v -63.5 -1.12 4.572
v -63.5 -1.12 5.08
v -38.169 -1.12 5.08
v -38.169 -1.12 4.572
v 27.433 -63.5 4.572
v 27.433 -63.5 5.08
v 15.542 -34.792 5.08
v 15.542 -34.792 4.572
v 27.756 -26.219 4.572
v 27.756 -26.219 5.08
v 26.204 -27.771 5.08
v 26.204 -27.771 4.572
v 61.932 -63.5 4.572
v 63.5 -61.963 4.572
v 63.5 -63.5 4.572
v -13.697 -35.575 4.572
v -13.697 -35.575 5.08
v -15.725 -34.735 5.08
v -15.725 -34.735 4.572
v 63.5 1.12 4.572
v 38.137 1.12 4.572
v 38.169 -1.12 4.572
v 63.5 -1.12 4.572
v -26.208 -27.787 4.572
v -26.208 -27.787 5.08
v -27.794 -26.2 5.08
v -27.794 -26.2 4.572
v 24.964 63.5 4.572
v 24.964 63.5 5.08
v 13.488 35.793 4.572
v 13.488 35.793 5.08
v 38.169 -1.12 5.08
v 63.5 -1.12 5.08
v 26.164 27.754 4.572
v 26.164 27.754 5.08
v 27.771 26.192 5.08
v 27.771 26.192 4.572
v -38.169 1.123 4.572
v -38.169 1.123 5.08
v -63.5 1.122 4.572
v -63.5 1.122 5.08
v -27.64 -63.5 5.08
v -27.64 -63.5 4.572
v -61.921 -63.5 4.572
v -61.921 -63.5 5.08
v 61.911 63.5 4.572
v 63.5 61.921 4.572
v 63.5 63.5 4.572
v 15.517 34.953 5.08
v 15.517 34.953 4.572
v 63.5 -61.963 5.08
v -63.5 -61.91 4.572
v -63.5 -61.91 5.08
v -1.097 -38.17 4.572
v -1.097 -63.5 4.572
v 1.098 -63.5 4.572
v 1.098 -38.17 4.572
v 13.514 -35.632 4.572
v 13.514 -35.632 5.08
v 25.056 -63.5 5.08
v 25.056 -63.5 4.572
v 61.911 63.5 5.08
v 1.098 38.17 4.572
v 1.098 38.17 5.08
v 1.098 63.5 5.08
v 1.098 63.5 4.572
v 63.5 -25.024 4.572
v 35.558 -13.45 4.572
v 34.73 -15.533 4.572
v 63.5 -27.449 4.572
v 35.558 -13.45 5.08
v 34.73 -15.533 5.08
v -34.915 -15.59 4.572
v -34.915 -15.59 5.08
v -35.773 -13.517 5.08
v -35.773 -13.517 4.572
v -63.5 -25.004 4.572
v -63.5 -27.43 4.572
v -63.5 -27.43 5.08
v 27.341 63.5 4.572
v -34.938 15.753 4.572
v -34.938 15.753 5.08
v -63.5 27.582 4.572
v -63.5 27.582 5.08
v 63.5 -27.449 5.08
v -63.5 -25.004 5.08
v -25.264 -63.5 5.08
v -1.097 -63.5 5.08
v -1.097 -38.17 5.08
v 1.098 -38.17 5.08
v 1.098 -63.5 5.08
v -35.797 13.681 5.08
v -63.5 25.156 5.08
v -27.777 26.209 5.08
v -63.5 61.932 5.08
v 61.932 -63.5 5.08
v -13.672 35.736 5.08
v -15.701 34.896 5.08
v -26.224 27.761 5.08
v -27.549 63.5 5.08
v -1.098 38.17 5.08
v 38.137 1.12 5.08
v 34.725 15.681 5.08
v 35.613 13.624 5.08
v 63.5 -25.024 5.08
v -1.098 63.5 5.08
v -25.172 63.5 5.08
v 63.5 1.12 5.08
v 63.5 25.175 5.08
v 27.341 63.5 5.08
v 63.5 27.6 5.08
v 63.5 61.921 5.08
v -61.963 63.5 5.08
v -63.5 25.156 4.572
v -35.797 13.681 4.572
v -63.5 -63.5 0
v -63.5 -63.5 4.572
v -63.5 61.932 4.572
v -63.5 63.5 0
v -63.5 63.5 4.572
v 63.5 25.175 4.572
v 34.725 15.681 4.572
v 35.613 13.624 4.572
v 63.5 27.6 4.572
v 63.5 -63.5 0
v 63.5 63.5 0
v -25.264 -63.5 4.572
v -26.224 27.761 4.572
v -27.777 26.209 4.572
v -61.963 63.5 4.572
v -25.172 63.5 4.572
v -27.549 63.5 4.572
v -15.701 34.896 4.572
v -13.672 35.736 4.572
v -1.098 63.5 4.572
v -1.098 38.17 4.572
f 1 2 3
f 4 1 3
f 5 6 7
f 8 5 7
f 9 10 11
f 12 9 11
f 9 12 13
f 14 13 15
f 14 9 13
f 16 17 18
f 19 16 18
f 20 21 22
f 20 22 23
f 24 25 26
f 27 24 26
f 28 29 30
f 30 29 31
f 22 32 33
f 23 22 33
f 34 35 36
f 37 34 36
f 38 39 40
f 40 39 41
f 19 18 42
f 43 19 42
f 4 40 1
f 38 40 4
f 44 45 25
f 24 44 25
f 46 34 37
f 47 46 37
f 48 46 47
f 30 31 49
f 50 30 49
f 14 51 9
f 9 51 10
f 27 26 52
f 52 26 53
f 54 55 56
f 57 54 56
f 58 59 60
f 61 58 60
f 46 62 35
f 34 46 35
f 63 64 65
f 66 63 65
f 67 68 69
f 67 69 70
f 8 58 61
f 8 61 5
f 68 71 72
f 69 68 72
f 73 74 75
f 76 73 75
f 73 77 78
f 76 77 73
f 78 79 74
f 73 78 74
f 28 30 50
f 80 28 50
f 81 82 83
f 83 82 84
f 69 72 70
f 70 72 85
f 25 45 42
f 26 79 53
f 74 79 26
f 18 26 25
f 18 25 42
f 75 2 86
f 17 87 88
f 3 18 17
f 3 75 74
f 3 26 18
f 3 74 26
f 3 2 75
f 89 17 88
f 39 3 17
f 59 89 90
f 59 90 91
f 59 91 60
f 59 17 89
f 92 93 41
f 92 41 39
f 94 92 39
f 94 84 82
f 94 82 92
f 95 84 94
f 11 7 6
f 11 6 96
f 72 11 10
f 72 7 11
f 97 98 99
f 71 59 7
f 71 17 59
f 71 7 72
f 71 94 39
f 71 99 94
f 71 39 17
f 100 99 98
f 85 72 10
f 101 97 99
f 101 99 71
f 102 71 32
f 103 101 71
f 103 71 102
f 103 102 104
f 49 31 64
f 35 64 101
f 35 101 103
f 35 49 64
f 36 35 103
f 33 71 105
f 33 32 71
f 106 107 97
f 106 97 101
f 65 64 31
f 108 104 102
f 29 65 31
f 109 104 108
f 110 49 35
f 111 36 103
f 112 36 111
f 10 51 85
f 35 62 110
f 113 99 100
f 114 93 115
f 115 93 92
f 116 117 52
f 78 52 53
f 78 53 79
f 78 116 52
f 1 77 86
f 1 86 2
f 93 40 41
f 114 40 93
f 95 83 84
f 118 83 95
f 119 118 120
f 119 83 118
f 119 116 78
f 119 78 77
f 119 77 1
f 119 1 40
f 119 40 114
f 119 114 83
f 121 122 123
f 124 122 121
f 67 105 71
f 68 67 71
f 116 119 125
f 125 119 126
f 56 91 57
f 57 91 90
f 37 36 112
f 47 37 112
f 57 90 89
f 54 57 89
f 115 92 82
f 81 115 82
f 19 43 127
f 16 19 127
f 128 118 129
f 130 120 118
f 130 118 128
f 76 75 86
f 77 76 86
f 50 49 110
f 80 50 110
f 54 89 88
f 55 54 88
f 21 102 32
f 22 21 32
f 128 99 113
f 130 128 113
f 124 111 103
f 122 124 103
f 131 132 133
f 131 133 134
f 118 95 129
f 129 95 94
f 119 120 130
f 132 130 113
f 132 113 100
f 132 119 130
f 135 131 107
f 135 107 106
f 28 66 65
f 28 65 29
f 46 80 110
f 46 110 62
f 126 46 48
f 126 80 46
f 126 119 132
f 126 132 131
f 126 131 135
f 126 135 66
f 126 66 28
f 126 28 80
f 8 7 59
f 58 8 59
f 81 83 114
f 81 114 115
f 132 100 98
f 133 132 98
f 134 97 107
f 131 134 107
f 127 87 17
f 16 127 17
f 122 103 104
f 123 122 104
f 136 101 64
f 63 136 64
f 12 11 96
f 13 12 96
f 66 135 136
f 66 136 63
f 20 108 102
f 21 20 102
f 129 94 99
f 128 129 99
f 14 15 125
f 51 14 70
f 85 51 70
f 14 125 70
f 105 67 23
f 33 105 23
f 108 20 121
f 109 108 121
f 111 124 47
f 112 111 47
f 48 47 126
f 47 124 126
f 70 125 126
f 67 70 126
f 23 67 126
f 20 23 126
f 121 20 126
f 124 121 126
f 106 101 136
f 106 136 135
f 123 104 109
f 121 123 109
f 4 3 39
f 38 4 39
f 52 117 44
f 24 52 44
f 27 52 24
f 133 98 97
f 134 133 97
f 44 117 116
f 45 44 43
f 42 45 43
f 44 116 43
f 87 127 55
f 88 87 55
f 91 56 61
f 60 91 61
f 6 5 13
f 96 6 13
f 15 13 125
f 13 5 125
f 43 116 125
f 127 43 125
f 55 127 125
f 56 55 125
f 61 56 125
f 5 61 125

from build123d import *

# Parameters (mm, degrees)
F0_W     = 127
F0_H     = 127
F1_DEPTH = 5.08
F2_W     = 2.19577
F2_H     = 52.046703
F3_DEPTH = 0.508


with BuildPart() as f1:
    # F0 (on Top) → F1 (new body)
    with BuildSketch(Plane.XY):
        Rectangle(F0_W, F0_H)
    extrude(amount=F1_DEPTH)

    # F2 (on face) → F3 (cut)
    with BuildSketch(Plane.XY.offset(5.08)):
        Polygon((38.169024, -1.120174), (90.2161, -1.120174), (90.2161, 1.120174), (38.13681, 1.120174), align=None)
        Polygon((-1.096878, -38.1697), (-1.097885, -90.216374), (1.097885, -90.216374), (1.097885, -38.169671), align=None)
        with Locations((0, 64.193022)):
            Rectangle(F2_W, F2_H)
        Polygon((-38.168937, 1.123112), (-90.2161, 1.120174), (-90.2161, -1.120174), (-38.169024, -1.120174), align=None)
        Polygon((27.771347, 26.192397), (64.574188, 62.995238), (62.990023, 64.579402), (26.164404, 27.753783), align=None)
        Polygon((26.204134, -27.77076), (63.005977, -64.574029), (64.558622, -63.021384), (27.756045, -26.218808), align=None)
        Polygon((-63.026599, 64.563836), (-64.579243, 63.011192), (-27.776666, 26.208615), (-26.224022, 27.761259), align=None)
        Polygon((-27.793985, -26.20045), (-64.594809, -63.00543), (-63.010644, -64.589595), (-26.207804, -27.786754), align=None)
        Polygon((35.612549, 13.623586), (83.697778, 33.54114), (82.840434, 35.610951), (34.725444, 15.681069), align=None)
        Polygon((13.513826, -35.632124), (33.430295, -83.717366), (35.458923, -82.877081), (15.541512, -34.792197), align=None)
        Polygon((-33.589701, 83.821042), (-35.618328, 82.980757), (-15.700917, 34.895874), (-13.67229, 35.736159), align=None)
        Polygon((-35.772999, -13.517161), (-83.857183, -33.437463), (-82.999839, -35.507274), (-34.914611, -15.58972), align=None)
        Polygon((34.73032, -15.532565), (82.815549, -35.450119), (83.672893, -33.380308), (35.557903, -13.450427), align=None)
        Polygon((-15.724882, -34.735455), (-35.643213, -82.819926), (-33.614586, -83.660211), (-13.697175, -35.575328), align=None)
        Polygon((35.434038, 83.037912), (33.405411, 83.878197), (13.488, 35.793313), (15.516627, 34.953028), align=None)
        Polygon((-34.938291, 15.753233), (-83.024724, 35.668105), (-83.882068, 33.598294), (-35.796839, 13.68074), align=None)
    extrude(amount=-F3_DEPTH, mode=Mode.SUBTRACT)


solid = f1.part
